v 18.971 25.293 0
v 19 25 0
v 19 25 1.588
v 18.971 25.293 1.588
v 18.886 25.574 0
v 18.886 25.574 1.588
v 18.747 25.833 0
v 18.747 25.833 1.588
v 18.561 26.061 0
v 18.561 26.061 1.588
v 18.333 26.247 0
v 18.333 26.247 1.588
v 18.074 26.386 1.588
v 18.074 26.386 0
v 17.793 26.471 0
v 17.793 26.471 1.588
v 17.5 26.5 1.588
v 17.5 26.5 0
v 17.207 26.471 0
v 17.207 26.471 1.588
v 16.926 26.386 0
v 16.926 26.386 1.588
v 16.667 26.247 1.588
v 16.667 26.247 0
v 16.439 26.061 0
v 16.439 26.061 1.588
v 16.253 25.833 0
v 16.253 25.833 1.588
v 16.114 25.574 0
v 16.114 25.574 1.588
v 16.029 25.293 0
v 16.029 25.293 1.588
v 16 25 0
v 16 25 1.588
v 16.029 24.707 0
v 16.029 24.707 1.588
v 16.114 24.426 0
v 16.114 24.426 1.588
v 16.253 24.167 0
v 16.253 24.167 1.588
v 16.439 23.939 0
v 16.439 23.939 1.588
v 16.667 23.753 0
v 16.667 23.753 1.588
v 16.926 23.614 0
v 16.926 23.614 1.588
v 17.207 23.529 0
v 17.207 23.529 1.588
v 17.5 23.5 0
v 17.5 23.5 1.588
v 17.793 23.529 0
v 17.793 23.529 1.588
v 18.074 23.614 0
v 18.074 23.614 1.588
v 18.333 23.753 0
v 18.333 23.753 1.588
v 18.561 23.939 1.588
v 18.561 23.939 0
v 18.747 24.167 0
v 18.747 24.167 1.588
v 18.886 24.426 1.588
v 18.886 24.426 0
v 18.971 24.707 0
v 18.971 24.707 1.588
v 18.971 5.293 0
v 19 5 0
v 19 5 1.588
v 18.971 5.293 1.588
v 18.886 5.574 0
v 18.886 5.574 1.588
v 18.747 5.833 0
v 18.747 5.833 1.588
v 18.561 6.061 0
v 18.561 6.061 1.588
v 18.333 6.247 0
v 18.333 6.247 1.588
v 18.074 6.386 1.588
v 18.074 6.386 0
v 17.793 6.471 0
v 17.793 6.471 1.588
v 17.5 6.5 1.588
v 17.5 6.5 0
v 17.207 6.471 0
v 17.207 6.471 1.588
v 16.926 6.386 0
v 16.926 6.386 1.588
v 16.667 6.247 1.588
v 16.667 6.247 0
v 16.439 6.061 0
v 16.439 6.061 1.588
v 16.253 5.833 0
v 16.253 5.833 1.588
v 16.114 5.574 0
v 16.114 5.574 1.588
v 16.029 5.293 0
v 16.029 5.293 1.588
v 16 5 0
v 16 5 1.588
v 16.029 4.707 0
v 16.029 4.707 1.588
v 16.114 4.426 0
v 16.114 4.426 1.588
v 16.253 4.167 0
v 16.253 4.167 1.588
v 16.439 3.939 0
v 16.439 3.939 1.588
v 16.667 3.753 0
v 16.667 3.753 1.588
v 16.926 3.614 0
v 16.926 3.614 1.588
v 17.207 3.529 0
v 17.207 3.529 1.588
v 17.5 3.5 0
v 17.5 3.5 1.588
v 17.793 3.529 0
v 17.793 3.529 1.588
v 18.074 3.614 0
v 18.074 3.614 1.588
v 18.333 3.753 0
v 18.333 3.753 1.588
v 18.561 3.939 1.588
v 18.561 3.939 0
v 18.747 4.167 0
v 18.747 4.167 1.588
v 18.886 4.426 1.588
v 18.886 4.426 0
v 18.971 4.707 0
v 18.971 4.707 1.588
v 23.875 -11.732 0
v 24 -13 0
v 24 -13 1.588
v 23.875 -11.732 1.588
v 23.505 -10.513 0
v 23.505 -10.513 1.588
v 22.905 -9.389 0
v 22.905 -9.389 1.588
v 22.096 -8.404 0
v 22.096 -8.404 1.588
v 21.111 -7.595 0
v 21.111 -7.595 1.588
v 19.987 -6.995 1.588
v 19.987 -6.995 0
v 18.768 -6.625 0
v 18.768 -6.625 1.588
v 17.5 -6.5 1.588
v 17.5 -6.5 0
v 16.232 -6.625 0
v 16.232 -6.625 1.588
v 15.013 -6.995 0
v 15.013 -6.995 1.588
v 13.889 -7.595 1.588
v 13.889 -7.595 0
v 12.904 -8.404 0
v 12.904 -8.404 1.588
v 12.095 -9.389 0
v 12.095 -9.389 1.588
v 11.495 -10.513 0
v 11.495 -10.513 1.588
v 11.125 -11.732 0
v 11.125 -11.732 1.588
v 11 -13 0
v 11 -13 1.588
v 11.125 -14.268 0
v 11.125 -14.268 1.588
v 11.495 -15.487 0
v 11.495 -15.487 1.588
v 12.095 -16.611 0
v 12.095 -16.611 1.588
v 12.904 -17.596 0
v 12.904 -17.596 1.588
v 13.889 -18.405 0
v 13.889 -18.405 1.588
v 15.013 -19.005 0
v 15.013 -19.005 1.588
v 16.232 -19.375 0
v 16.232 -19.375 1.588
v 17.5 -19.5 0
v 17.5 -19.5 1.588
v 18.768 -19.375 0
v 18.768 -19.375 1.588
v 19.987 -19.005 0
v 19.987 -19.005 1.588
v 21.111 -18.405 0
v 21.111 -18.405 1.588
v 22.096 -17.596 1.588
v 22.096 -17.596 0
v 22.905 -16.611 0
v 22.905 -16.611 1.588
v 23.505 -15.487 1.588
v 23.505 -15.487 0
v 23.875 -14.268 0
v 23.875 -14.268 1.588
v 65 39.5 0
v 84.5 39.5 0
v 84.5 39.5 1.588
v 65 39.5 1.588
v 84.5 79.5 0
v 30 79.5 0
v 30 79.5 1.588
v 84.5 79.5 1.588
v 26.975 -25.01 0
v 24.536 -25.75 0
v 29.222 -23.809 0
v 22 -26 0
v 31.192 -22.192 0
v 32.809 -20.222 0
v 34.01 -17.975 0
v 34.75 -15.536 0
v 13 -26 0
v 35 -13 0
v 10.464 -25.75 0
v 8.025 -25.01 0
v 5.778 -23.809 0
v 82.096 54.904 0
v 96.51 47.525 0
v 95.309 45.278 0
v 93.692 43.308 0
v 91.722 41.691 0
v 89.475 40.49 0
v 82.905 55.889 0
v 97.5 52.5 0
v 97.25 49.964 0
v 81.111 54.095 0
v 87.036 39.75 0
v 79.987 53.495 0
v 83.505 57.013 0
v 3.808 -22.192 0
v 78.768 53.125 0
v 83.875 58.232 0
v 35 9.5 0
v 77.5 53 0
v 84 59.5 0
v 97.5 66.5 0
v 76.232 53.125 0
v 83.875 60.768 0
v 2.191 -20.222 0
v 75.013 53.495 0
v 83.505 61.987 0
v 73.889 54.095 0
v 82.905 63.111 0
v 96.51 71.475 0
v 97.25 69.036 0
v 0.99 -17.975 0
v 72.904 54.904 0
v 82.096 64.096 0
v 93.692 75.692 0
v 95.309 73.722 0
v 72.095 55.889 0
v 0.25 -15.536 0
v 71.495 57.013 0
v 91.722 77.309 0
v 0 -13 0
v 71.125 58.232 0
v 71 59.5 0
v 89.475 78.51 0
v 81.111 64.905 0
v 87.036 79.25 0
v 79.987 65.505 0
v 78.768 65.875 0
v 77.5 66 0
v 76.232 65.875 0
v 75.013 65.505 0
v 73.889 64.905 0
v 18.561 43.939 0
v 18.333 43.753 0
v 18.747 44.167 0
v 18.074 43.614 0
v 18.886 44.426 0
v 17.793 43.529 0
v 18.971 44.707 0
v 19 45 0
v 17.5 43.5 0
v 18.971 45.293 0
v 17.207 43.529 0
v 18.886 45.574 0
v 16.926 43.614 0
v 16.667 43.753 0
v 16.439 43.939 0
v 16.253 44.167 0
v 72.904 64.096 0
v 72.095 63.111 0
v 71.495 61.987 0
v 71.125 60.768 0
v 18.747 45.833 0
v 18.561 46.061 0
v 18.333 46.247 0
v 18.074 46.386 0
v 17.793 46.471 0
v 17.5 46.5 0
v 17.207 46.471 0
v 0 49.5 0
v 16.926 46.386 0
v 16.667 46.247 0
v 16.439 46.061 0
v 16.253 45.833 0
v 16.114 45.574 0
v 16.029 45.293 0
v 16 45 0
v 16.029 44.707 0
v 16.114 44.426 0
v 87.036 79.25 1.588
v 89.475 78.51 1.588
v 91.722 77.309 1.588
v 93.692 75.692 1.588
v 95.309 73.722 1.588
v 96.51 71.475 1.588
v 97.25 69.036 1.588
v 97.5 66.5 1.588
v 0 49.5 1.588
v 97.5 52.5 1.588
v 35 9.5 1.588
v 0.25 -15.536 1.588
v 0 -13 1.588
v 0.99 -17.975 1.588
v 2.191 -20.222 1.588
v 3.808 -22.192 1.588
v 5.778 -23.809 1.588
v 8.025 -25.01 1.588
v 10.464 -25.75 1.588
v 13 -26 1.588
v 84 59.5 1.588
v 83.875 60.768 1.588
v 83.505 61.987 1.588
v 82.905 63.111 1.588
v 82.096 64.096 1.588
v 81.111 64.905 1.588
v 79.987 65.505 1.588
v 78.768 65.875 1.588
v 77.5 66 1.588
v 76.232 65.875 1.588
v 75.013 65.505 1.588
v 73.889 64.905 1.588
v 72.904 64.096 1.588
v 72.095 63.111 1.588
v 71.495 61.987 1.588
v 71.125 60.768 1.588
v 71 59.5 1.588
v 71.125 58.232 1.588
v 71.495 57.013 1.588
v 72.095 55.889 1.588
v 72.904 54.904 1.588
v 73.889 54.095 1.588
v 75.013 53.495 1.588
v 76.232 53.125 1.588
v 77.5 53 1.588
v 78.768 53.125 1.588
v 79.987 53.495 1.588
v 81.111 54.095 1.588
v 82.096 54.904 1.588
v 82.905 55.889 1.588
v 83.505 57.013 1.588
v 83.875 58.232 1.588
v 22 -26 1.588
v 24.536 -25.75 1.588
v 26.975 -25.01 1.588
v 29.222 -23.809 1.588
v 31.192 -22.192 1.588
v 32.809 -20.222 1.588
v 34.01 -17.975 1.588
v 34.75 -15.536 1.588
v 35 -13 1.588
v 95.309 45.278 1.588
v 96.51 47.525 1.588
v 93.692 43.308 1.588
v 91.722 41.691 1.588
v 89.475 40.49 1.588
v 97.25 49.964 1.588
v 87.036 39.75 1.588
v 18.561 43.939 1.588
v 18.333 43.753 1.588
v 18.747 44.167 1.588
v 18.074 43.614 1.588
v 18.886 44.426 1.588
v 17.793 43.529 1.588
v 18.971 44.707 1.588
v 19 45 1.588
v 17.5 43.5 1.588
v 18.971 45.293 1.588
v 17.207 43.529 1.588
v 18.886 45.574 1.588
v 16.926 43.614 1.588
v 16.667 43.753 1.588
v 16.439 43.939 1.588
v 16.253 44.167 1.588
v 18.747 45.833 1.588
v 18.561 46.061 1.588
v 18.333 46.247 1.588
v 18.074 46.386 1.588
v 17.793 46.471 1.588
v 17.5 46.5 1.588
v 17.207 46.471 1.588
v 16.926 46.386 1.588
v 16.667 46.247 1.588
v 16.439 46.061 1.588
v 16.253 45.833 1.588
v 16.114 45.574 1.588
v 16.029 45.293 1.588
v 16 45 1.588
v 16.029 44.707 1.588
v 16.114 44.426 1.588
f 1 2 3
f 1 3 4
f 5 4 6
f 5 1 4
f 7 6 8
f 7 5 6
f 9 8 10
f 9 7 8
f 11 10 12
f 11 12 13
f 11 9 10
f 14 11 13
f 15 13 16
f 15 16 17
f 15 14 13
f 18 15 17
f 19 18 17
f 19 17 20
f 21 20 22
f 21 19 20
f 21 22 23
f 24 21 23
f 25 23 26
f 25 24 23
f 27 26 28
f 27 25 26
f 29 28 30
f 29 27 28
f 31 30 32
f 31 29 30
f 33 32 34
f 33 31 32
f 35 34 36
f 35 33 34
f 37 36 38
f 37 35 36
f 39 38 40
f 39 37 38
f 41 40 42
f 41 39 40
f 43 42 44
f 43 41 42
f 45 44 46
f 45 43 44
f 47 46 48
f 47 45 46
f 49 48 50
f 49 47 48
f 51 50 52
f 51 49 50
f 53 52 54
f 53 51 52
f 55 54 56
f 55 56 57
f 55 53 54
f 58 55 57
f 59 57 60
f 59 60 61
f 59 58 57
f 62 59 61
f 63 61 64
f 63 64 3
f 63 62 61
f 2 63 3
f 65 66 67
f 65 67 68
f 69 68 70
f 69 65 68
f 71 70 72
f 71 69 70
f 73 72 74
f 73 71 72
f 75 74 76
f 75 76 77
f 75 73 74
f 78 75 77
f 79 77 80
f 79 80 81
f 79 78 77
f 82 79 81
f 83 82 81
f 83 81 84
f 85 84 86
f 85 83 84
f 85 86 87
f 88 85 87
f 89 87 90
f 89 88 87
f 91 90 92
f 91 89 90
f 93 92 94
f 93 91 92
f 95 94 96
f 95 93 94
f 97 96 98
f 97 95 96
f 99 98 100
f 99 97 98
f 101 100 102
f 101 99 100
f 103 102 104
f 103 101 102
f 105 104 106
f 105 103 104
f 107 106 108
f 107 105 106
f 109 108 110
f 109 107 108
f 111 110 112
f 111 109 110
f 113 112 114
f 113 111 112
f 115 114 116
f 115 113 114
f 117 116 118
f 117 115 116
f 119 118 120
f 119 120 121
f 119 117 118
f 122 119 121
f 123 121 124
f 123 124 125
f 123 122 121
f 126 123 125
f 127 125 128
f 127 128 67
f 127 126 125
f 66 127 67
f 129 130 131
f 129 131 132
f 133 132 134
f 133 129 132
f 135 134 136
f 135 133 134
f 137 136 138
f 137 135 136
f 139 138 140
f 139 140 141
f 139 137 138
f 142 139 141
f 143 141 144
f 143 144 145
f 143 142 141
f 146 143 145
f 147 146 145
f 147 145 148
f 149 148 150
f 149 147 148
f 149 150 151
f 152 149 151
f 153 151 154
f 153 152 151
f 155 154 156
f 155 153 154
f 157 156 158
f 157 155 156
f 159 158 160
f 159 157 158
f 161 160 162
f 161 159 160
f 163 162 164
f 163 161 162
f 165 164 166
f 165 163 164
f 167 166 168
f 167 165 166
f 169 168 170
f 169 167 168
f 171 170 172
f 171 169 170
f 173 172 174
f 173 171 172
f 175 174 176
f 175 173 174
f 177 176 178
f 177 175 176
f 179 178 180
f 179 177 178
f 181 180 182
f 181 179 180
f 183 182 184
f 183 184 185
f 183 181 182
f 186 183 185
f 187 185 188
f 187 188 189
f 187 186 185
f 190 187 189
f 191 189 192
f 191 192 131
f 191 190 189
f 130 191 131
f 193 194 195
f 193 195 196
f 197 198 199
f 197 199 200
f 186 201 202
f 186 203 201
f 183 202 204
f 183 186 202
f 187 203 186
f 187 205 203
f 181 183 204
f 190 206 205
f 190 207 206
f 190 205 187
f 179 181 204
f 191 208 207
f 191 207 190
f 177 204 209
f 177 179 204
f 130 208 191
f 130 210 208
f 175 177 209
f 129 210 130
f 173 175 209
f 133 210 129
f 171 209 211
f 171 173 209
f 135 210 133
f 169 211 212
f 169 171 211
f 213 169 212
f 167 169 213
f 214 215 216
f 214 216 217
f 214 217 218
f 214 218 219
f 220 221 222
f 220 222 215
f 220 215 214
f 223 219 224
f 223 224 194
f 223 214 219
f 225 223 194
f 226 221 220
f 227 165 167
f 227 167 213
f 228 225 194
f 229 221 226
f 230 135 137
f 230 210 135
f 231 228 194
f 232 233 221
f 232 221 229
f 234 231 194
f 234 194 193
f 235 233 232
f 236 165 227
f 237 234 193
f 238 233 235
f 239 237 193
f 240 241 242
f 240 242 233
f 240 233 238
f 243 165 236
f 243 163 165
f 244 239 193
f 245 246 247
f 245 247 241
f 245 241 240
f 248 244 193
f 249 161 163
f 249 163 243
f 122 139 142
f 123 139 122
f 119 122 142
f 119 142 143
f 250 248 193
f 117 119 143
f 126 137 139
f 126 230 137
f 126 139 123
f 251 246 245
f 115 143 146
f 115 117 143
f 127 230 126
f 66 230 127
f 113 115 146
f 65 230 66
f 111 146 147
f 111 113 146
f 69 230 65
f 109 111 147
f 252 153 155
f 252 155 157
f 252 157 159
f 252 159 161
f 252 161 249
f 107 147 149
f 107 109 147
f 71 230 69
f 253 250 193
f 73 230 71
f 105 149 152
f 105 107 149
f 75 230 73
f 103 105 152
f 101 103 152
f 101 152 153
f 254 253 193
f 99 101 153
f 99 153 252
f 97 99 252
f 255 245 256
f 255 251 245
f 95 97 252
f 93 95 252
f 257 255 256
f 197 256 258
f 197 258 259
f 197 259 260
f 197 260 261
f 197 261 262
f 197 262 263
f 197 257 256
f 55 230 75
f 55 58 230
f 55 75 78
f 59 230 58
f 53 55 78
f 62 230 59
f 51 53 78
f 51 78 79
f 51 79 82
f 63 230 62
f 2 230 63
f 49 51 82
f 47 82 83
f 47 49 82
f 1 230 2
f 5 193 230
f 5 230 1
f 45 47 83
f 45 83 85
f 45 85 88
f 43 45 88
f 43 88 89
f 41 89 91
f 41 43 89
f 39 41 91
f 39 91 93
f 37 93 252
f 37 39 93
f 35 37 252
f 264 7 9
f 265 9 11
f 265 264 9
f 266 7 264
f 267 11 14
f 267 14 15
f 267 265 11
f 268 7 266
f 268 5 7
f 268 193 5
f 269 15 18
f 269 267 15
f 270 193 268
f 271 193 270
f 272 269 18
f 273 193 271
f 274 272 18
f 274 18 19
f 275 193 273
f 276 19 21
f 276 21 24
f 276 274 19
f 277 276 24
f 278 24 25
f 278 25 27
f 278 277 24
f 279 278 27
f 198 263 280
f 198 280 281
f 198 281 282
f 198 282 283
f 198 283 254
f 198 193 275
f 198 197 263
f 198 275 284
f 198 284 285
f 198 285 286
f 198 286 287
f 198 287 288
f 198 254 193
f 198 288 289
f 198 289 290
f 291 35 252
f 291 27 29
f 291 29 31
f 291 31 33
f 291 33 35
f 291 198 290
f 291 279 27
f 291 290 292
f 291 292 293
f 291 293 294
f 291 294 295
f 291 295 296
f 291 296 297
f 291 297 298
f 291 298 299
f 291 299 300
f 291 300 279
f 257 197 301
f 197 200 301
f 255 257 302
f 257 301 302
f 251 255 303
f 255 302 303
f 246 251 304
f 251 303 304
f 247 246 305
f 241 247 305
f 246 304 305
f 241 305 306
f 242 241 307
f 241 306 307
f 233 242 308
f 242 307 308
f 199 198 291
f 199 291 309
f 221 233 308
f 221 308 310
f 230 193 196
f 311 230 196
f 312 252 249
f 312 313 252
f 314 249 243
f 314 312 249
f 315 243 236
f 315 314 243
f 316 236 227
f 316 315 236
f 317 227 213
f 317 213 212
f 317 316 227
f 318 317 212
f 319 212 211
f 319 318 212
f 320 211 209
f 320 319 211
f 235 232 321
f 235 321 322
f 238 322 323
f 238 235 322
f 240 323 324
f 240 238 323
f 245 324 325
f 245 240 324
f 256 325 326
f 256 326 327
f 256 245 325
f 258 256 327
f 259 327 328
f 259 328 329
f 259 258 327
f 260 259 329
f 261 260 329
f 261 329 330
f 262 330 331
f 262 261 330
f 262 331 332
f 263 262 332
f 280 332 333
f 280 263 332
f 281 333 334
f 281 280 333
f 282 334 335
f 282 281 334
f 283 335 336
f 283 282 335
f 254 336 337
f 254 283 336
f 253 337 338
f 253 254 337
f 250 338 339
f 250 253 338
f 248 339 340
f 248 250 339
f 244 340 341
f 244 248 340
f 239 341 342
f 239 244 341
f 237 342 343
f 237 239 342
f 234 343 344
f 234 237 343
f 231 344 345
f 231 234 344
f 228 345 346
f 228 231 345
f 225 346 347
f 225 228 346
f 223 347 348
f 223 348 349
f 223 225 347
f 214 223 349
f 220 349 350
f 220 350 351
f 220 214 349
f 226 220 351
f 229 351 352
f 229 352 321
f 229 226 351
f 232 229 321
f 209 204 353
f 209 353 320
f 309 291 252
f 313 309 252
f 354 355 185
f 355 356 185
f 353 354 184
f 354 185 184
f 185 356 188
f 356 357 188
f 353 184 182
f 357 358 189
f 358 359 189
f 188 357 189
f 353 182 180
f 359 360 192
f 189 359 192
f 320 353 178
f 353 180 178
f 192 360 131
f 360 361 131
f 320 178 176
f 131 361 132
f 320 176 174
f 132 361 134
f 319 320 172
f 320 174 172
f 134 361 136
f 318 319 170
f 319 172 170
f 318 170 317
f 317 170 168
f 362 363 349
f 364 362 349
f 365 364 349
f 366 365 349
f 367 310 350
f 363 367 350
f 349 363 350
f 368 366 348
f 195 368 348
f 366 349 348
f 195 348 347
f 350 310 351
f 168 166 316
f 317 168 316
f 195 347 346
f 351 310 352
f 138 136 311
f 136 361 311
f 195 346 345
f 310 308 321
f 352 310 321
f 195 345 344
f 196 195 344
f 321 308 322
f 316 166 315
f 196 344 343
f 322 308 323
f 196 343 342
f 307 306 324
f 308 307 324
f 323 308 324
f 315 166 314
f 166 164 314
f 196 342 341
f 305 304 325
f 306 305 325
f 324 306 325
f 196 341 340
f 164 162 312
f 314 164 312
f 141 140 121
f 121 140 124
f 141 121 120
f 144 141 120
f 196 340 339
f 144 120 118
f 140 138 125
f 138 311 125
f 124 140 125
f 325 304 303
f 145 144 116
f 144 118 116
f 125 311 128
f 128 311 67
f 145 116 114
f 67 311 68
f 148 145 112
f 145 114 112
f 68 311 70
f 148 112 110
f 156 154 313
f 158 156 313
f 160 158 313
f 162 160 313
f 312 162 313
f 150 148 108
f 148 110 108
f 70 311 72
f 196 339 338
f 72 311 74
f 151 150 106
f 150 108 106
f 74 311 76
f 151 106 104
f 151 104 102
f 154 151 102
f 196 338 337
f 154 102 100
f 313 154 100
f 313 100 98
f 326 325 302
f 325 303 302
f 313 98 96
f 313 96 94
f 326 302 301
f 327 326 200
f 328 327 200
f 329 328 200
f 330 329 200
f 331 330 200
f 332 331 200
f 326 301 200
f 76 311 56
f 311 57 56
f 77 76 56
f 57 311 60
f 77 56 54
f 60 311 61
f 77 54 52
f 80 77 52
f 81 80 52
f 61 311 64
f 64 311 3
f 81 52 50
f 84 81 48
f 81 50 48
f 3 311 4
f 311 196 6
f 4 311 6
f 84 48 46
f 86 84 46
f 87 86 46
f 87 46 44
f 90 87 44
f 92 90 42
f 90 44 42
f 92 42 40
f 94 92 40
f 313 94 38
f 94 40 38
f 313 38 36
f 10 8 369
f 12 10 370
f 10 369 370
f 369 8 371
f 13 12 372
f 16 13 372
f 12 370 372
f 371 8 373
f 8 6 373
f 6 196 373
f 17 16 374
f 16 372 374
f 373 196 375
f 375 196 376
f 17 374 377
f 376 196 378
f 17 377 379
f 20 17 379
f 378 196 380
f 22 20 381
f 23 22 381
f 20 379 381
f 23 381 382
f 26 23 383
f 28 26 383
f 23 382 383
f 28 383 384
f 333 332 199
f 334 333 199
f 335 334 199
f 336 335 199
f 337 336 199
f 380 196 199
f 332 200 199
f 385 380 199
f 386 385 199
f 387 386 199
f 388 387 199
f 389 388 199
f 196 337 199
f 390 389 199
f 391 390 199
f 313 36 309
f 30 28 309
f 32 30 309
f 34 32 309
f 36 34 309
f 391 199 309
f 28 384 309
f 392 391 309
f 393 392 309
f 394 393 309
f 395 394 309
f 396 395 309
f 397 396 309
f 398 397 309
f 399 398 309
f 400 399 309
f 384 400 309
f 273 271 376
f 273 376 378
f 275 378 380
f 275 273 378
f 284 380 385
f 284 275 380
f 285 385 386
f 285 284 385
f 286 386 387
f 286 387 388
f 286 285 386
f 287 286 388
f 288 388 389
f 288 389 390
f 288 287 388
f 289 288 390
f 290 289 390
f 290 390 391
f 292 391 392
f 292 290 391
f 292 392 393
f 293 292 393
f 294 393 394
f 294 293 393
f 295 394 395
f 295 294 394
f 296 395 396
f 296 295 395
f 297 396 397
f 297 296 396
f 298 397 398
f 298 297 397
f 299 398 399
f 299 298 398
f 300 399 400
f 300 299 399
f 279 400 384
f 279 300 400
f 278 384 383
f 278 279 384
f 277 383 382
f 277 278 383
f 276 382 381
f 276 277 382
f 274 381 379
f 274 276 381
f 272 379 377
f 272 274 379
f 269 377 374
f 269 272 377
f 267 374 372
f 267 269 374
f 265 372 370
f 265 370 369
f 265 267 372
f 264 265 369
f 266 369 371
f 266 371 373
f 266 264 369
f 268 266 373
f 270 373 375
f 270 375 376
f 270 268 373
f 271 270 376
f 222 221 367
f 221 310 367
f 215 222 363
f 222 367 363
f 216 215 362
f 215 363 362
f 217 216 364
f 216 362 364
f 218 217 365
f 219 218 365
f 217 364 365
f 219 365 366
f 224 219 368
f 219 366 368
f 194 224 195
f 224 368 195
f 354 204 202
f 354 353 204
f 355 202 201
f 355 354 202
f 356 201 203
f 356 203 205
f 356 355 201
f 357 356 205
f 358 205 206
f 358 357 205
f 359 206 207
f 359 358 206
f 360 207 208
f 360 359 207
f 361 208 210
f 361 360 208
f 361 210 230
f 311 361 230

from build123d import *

# Parameters (mm, degrees)
SKETCH1_R           = 6.5
SKETCH1_R_2         = 1.5
BOSS_EXTRUDE1_DEPTH = 1.5875
FILLET2_R           = 13
CHAMFER1_SIZE       = 30


with BuildPart() as part:
    # Sketch1 → Boss-Extrude1 (new body)
    with BuildSketch(Plane.XY):
        Polygon((0, 0), (0, 50), (0, 79.5), (97.5, 79.5), (97.5, 39.5), (35, 39.5), (35, 0), (35, -26), (0, -26), align=None)
        with Locations((17.5, -13)):
            Circle(SKETCH1_R, mode=Mode.SUBTRACT)
        with Locations((77.5, 59.5)):
            Circle(SKETCH1_R, mode=Mode.SUBTRACT)
        with Locations((17.5, 45)):
            Circle(SKETCH1_R_2, mode=Mode.SUBTRACT)
        with Locations((17.5, 25)):
            Circle(SKETCH1_R_2, mode=Mode.SUBTRACT)
        with Locations((17.5, 5)):
            Circle(SKETCH1_R_2, mode=Mode.SUBTRACT)
    extrude(amount=BOSS_EXTRUDE1_DEPTH)

    # Fillet2
    fillet2_edges = [part.edges().sort_by_distance(p)[0] for p in [
        (97.5, 79.5, 0.79375),
        (97.5, 39.5, 0.79375),
        (35, -26, 0.79375),
        (0, -26, 0.79375),
    ]]
    fillet(fillet2_edges, radius=FILLET2_R)

    # Chamfer1
    chamfer1_edges = [part.edges().sort_by_distance(p)[0] for p in [
        (0, 79.5, 0.79375),
        (35, 39.5, 0.79375),
    ]]
    chamfer(chamfer1_edges, length=CHAMFER1_SIZE)


solid = part.part
